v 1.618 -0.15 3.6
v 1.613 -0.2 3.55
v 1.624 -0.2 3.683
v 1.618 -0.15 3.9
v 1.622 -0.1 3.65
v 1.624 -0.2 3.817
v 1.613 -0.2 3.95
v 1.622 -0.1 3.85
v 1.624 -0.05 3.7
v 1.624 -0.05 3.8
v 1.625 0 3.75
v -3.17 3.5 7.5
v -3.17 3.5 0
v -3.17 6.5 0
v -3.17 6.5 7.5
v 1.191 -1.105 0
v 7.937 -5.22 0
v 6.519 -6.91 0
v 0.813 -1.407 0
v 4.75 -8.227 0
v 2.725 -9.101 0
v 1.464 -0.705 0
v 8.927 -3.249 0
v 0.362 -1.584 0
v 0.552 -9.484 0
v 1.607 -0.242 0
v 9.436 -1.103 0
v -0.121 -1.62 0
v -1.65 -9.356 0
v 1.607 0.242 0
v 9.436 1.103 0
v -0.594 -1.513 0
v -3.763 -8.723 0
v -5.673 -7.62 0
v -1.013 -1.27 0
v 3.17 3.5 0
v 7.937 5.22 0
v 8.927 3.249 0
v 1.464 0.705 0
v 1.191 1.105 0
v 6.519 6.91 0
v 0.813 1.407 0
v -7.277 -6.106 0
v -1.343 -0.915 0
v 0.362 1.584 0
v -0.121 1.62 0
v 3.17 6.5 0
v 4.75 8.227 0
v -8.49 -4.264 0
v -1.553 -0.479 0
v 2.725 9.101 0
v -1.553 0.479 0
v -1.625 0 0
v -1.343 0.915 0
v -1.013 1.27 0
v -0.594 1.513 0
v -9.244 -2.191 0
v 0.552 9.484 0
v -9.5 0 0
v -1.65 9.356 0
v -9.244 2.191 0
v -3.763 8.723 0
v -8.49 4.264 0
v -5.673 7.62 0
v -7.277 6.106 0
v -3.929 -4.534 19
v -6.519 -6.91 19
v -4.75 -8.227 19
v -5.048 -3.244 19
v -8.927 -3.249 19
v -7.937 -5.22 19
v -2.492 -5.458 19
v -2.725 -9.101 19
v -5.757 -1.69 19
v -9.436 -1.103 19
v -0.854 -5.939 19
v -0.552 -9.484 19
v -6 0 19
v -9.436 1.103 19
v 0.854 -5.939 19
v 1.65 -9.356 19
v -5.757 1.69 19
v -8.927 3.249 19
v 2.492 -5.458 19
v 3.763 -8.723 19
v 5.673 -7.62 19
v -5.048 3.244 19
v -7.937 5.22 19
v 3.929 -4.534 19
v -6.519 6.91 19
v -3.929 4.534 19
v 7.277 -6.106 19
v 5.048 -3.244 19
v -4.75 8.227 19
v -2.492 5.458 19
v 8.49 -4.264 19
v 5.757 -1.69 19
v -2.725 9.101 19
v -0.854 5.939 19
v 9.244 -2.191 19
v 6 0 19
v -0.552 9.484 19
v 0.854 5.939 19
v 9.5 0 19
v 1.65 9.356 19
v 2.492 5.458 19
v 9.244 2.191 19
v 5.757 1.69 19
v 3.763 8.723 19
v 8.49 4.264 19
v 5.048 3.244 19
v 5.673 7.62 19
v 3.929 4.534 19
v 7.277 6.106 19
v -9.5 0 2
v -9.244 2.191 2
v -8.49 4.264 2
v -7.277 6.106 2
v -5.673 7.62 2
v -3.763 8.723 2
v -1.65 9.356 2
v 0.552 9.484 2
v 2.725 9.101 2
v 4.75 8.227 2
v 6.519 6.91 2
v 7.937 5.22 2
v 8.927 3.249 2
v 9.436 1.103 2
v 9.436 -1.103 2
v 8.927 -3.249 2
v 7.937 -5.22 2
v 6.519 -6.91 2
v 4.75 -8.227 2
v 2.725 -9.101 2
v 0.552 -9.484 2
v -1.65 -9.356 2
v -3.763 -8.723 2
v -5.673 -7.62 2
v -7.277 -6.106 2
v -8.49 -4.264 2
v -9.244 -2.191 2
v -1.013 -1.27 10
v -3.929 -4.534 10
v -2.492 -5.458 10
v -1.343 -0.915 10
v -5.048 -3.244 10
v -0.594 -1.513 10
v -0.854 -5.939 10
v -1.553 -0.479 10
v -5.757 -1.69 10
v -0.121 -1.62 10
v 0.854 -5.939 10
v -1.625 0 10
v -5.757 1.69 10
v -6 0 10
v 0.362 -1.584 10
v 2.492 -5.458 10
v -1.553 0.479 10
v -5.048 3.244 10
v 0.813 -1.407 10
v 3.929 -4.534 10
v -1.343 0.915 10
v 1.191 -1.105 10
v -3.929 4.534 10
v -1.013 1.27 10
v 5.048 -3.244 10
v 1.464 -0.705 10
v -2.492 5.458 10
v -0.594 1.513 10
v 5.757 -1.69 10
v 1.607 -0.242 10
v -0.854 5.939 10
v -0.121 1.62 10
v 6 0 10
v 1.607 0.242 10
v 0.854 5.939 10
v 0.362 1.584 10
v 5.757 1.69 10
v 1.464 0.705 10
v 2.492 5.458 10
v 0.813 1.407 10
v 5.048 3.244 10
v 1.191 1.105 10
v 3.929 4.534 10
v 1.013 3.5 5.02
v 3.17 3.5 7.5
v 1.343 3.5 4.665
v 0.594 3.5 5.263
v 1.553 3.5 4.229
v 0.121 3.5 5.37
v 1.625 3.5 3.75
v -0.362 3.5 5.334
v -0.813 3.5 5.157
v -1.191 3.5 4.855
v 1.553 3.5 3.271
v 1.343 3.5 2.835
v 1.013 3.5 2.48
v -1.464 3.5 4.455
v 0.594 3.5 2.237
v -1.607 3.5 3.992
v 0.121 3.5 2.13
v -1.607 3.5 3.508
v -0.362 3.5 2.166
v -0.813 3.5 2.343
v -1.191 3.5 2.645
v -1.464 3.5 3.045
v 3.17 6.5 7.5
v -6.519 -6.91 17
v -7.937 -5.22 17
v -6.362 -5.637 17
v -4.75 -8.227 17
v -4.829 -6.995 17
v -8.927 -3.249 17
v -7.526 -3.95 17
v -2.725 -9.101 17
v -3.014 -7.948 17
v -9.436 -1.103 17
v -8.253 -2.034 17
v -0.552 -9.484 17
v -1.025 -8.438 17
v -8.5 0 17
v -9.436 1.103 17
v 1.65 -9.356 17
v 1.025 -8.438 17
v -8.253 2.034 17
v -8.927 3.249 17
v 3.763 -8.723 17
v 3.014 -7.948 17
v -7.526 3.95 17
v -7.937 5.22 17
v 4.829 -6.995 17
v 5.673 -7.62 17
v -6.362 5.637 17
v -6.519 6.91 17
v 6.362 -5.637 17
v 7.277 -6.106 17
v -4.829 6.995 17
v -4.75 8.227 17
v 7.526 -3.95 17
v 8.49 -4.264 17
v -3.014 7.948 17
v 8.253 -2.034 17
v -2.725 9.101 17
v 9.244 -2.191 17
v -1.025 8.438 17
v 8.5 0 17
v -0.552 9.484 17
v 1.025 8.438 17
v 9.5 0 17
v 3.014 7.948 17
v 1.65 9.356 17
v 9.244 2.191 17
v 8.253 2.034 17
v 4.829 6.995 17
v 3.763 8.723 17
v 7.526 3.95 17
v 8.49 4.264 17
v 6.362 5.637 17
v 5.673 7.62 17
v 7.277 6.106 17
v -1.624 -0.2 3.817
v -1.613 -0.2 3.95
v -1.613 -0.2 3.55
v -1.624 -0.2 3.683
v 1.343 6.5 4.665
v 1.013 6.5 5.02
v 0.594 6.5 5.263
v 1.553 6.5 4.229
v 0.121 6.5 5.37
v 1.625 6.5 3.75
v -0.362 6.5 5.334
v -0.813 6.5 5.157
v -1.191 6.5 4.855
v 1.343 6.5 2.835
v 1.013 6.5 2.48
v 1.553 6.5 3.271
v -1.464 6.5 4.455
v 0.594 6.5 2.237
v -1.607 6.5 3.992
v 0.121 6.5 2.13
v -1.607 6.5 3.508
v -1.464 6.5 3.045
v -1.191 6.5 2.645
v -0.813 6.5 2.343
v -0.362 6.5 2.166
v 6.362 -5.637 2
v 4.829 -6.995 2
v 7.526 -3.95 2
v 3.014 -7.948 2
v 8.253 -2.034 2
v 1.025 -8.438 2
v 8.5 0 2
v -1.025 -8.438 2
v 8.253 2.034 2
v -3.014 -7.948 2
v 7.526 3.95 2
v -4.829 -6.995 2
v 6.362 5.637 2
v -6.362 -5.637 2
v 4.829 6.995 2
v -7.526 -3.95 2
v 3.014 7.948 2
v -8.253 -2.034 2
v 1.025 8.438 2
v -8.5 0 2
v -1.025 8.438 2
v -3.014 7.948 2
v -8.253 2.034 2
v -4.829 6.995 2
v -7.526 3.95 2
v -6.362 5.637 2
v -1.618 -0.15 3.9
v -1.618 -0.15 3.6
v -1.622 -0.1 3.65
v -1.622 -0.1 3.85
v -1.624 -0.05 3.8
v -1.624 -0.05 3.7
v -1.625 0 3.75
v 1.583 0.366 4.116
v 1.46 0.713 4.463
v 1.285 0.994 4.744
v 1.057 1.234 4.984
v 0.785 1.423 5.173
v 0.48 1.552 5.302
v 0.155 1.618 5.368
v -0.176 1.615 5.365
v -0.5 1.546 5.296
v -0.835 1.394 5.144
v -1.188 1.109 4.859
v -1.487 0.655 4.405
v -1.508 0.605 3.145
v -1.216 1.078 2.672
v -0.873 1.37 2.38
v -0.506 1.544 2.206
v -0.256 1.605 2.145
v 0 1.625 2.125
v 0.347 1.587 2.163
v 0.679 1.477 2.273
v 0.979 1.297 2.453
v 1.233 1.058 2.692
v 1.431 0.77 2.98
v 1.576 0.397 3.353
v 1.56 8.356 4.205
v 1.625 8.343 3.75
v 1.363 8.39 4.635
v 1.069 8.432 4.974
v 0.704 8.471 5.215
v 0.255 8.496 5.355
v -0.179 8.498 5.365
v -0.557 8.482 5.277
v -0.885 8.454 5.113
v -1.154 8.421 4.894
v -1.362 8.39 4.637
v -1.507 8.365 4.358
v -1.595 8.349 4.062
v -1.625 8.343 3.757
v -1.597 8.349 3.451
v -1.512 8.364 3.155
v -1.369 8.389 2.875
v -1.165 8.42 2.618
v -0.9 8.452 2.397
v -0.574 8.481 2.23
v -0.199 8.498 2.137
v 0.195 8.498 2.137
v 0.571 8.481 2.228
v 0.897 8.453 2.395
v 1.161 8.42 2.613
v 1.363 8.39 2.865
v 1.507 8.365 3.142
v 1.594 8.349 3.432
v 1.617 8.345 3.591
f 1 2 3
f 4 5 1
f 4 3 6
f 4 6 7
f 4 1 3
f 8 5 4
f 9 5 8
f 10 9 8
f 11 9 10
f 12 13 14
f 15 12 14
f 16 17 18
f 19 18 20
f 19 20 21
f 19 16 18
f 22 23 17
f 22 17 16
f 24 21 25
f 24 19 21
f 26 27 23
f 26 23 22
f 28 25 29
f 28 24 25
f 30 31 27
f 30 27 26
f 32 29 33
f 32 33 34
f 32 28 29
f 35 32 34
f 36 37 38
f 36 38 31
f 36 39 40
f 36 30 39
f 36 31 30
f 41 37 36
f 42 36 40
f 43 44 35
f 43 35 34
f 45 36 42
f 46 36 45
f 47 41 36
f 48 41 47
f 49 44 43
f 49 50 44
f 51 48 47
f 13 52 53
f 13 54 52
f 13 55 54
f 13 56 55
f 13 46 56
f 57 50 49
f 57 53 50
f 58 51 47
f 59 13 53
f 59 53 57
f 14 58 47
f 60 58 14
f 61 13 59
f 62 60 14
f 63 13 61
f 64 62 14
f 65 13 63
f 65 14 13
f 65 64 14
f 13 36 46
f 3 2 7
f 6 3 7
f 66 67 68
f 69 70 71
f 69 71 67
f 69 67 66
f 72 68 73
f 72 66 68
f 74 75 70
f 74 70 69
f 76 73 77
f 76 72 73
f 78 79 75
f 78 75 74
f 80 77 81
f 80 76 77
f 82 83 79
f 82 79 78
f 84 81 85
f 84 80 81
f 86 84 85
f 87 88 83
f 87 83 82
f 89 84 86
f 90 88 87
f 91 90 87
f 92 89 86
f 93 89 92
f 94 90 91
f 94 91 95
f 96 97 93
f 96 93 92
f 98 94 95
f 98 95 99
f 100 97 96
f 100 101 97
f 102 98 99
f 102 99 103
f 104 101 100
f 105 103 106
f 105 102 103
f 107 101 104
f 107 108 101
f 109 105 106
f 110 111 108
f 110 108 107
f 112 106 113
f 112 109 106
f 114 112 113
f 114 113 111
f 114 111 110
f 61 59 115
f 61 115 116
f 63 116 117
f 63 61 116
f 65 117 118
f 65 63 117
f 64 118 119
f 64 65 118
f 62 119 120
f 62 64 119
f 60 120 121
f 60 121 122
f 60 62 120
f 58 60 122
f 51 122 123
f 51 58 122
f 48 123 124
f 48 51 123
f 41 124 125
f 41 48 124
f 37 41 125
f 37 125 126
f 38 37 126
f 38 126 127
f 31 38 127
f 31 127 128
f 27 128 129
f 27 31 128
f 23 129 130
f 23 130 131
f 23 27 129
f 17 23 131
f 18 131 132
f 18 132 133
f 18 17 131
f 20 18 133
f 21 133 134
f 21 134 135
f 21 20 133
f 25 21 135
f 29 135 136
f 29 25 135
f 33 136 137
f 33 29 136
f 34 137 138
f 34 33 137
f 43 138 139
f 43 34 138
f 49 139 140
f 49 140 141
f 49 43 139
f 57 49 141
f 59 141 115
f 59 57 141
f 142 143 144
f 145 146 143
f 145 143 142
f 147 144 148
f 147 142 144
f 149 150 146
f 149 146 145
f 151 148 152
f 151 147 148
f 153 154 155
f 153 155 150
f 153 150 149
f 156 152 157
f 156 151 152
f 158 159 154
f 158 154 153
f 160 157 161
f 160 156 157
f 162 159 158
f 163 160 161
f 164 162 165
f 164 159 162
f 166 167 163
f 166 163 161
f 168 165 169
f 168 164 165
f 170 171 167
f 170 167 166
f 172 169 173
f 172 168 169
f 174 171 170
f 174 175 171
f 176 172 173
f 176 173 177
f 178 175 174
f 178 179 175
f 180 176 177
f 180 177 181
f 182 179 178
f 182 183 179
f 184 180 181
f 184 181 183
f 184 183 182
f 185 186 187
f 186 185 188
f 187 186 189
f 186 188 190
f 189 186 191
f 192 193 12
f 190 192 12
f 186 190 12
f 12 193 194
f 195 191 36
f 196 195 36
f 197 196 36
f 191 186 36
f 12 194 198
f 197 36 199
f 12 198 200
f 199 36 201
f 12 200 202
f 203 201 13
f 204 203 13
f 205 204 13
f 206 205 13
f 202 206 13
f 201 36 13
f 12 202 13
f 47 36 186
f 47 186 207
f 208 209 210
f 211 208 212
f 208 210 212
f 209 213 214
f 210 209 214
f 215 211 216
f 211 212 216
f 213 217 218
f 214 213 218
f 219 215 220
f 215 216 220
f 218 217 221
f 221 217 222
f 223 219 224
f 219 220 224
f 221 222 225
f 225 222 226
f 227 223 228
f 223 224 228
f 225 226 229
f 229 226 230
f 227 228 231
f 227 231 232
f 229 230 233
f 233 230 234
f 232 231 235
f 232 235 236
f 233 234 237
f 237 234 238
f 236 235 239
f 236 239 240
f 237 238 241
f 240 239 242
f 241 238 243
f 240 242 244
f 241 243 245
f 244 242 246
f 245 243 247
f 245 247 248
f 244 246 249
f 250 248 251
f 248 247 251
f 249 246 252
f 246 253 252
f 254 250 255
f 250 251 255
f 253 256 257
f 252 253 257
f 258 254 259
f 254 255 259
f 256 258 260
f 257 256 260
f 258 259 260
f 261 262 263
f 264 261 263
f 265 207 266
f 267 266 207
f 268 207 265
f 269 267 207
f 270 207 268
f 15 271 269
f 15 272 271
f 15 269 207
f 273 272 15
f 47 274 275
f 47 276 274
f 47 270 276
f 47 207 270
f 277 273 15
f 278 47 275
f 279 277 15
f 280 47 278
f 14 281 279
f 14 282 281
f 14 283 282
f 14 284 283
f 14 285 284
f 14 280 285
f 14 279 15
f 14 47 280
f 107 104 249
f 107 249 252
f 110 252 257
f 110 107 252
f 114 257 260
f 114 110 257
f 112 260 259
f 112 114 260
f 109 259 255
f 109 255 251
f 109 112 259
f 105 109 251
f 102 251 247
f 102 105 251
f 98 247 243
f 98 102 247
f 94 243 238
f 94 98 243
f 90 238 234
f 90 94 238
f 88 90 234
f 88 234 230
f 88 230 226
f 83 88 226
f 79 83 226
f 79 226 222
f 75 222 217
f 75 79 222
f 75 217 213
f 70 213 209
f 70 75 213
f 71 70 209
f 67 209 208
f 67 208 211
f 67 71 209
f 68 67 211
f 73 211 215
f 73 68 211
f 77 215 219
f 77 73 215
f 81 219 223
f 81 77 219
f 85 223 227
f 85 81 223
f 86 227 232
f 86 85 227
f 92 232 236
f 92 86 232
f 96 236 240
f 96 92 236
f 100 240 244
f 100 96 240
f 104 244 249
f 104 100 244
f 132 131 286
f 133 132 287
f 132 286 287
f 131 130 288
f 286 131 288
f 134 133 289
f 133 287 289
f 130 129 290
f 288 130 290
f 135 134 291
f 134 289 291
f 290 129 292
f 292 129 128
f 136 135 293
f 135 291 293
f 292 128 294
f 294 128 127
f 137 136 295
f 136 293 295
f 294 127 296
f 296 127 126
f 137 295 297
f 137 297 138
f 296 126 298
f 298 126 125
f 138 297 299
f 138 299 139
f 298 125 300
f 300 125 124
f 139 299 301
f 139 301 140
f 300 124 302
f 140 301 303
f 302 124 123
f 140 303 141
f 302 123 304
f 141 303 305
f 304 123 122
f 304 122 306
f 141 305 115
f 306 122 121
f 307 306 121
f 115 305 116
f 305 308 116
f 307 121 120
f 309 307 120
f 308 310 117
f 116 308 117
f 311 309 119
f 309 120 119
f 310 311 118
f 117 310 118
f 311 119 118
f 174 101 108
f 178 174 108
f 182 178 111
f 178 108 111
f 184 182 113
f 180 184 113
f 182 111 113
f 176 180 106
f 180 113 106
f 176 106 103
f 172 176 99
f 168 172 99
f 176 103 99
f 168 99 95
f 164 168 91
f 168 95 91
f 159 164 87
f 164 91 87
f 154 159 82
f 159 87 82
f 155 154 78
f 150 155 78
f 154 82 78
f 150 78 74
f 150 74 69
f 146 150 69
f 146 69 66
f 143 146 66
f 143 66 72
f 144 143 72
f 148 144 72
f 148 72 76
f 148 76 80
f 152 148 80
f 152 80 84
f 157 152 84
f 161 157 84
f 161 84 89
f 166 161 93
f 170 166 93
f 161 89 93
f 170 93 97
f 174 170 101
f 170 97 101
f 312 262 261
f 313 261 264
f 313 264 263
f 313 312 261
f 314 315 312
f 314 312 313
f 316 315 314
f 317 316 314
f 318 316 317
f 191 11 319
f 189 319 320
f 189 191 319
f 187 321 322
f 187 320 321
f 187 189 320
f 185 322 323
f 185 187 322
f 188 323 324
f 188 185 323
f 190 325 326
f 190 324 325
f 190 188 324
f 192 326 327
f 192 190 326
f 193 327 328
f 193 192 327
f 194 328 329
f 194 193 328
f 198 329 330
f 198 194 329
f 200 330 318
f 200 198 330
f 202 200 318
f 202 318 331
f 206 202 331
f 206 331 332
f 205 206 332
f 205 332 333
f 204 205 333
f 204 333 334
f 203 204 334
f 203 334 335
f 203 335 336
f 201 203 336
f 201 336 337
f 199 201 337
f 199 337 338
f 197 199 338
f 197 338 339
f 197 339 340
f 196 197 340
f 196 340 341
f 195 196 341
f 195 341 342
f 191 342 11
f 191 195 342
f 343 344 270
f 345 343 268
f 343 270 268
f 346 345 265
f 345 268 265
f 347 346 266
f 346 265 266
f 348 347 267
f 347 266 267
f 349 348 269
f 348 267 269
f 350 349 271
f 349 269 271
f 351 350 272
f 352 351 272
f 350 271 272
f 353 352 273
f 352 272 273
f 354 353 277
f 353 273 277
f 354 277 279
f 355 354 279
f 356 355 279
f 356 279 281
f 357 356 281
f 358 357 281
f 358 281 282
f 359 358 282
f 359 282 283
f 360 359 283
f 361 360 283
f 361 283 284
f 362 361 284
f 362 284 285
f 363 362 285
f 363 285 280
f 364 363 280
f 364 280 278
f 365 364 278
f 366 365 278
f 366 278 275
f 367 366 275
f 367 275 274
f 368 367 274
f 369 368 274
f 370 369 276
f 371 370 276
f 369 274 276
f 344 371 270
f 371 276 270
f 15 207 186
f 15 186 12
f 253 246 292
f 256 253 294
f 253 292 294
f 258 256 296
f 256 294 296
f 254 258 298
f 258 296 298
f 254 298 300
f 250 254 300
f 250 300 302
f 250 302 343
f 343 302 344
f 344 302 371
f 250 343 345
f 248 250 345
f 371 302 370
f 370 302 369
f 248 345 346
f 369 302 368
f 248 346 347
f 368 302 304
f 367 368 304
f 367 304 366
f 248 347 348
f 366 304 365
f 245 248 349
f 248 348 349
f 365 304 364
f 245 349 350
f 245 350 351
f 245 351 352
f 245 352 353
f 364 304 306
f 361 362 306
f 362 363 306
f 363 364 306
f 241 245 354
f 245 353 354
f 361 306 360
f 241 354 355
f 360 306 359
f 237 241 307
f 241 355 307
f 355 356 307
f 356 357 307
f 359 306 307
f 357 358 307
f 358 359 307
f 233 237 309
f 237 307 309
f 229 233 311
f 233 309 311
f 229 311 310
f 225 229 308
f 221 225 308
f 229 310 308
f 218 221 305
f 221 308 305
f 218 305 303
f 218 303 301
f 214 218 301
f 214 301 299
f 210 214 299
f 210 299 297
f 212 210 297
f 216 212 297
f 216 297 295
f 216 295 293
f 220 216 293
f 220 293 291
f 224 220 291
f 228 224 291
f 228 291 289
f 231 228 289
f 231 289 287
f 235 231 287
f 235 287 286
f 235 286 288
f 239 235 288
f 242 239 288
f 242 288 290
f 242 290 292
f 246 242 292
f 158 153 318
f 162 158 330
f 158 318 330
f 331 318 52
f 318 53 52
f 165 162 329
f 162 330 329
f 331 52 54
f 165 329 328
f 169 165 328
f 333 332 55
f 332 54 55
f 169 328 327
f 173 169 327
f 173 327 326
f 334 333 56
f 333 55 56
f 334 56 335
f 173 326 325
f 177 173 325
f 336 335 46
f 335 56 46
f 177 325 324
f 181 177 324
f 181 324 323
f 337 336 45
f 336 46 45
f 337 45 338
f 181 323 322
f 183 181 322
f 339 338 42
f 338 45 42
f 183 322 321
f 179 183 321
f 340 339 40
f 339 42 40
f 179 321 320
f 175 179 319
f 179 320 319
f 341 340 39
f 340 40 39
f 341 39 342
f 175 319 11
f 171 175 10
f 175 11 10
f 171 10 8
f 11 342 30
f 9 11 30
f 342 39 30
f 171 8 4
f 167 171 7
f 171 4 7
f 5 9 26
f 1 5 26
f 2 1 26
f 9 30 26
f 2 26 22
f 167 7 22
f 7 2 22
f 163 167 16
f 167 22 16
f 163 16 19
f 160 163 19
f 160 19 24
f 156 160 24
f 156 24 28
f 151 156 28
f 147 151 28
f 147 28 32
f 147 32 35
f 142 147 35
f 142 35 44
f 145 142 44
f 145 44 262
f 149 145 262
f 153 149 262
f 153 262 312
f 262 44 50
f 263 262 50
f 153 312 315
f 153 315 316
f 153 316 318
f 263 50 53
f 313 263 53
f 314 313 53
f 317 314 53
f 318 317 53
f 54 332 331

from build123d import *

# Parameters (mm, degrees)
CROQUIS1_R                 = 8.5
SALIENTE_EXTRUIR1_DEPTH    = 19
CROQUIS2_R                 = 1.625
CORTAR_EXTRUIR1_DEPTH      = 1
CORTAR_EXTRUIR1_DEPTH_BACK = 20
CROQUIS3_W                 = 6.34
CROQUIS3_H                 = 3
CORTAR_EXTRUIR2_DEPTH      = 7.5
CROQUIS4_R                 = 9.5
CROQUIS4_R_2               = 8.5
SALIENTE_EXTRUIR2_DEPTH    = 2
CROQUIS5_R                 = 9.5
CROQUIS5_R_2               = 8.5
SALIENTE_EXTRUIR3_DEPTH    = 2
CROQUIS7_R                 = 1.625
CORTAR_EXTRUIR4_DEPTH      = 6.7
CORTAR_EXTRUIR4_DEPTH_BACK = 3
CROQUIS9_R                 = 6
CORTAR_EXTRUIR5_DEPTH      = 9


with BuildPart() as part:
    # Croquis1 → Saliente-Extruir1 (new body)
    with BuildSketch(Plane.XY):
        Circle(CROQUIS1_R)
    extrude(amount=SALIENTE_EXTRUIR1_DEPTH)

    # Croquis2 → Cortar-Extruir1 (cut, two sides)
    with BuildSketch(Plane(origin=(0, 0, 0), x_dir=(-1, 0, 0), z_dir=(0, 0, -1))) as cortar_extruir1_sk:
        Circle(CROQUIS2_R)
    extrude(amount=CORTAR_EXTRUIR1_DEPTH, mode=Mode.SUBTRACT)
    extrude(cortar_extruir1_sk.sketch, amount=-CORTAR_EXTRUIR1_DEPTH_BACK, mode=Mode.SUBTRACT)

    # Croquis3 → Cortar-Extruir2 (cut)
    with BuildSketch(Plane(origin=(0, 0, 0), x_dir=(-1, 0, 0), z_dir=(0, 0, -1))):
        with Locations((0, 5)):
            Rectangle(CROQUIS3_W, CROQUIS3_H)
    extrude(amount=-CORTAR_EXTRUIR2_DEPTH, mode=Mode.SUBTRACT)

    # Croquis4 → Saliente-Extruir2 (add)
    with BuildSketch(Plane(origin=(0, 0, 0), x_dir=(-1, 0, 0), z_dir=(0, 0, -1))):
        Circle(CROQUIS4_R)
        Circle(CROQUIS4_R_2, mode=Mode.SUBTRACT)
    extrude(amount=-SALIENTE_EXTRUIR2_DEPTH)

    # Croquis5 → Saliente-Extruir3 (add)
    with BuildSketch(Plane.XY.offset(19)):
        Circle(CROQUIS5_R)
        Circle(CROQUIS5_R_2, mode=Mode.SUBTRACT)
    extrude(amount=-SALIENTE_EXTRUIR3_DEPTH)

    # Croquis7 → Cortar-Extruir4 (cut, two sides)
    with BuildSketch(Plane.XZ.offset(-6.5)) as cortar_extruir4_sk:
        with Locations((0, 3.75)):
            Circle(CROQUIS7_R)
    extrude(amount=CORTAR_EXTRUIR4_DEPTH, mode=Mode.SUBTRACT)
    extrude(cortar_extruir4_sk.sketch, amount=-CORTAR_EXTRUIR4_DEPTH_BACK, mode=Mode.SUBTRACT)

    # Croquis9 → Cortar-Extruir5 (cut)
    with BuildSketch(Plane.XY.offset(19)):
        Circle(CROQUIS9_R)
    extrude(amount=-CORTAR_EXTRUIR5_DEPTH, mode=Mode.SUBTRACT)


solid = part.part
